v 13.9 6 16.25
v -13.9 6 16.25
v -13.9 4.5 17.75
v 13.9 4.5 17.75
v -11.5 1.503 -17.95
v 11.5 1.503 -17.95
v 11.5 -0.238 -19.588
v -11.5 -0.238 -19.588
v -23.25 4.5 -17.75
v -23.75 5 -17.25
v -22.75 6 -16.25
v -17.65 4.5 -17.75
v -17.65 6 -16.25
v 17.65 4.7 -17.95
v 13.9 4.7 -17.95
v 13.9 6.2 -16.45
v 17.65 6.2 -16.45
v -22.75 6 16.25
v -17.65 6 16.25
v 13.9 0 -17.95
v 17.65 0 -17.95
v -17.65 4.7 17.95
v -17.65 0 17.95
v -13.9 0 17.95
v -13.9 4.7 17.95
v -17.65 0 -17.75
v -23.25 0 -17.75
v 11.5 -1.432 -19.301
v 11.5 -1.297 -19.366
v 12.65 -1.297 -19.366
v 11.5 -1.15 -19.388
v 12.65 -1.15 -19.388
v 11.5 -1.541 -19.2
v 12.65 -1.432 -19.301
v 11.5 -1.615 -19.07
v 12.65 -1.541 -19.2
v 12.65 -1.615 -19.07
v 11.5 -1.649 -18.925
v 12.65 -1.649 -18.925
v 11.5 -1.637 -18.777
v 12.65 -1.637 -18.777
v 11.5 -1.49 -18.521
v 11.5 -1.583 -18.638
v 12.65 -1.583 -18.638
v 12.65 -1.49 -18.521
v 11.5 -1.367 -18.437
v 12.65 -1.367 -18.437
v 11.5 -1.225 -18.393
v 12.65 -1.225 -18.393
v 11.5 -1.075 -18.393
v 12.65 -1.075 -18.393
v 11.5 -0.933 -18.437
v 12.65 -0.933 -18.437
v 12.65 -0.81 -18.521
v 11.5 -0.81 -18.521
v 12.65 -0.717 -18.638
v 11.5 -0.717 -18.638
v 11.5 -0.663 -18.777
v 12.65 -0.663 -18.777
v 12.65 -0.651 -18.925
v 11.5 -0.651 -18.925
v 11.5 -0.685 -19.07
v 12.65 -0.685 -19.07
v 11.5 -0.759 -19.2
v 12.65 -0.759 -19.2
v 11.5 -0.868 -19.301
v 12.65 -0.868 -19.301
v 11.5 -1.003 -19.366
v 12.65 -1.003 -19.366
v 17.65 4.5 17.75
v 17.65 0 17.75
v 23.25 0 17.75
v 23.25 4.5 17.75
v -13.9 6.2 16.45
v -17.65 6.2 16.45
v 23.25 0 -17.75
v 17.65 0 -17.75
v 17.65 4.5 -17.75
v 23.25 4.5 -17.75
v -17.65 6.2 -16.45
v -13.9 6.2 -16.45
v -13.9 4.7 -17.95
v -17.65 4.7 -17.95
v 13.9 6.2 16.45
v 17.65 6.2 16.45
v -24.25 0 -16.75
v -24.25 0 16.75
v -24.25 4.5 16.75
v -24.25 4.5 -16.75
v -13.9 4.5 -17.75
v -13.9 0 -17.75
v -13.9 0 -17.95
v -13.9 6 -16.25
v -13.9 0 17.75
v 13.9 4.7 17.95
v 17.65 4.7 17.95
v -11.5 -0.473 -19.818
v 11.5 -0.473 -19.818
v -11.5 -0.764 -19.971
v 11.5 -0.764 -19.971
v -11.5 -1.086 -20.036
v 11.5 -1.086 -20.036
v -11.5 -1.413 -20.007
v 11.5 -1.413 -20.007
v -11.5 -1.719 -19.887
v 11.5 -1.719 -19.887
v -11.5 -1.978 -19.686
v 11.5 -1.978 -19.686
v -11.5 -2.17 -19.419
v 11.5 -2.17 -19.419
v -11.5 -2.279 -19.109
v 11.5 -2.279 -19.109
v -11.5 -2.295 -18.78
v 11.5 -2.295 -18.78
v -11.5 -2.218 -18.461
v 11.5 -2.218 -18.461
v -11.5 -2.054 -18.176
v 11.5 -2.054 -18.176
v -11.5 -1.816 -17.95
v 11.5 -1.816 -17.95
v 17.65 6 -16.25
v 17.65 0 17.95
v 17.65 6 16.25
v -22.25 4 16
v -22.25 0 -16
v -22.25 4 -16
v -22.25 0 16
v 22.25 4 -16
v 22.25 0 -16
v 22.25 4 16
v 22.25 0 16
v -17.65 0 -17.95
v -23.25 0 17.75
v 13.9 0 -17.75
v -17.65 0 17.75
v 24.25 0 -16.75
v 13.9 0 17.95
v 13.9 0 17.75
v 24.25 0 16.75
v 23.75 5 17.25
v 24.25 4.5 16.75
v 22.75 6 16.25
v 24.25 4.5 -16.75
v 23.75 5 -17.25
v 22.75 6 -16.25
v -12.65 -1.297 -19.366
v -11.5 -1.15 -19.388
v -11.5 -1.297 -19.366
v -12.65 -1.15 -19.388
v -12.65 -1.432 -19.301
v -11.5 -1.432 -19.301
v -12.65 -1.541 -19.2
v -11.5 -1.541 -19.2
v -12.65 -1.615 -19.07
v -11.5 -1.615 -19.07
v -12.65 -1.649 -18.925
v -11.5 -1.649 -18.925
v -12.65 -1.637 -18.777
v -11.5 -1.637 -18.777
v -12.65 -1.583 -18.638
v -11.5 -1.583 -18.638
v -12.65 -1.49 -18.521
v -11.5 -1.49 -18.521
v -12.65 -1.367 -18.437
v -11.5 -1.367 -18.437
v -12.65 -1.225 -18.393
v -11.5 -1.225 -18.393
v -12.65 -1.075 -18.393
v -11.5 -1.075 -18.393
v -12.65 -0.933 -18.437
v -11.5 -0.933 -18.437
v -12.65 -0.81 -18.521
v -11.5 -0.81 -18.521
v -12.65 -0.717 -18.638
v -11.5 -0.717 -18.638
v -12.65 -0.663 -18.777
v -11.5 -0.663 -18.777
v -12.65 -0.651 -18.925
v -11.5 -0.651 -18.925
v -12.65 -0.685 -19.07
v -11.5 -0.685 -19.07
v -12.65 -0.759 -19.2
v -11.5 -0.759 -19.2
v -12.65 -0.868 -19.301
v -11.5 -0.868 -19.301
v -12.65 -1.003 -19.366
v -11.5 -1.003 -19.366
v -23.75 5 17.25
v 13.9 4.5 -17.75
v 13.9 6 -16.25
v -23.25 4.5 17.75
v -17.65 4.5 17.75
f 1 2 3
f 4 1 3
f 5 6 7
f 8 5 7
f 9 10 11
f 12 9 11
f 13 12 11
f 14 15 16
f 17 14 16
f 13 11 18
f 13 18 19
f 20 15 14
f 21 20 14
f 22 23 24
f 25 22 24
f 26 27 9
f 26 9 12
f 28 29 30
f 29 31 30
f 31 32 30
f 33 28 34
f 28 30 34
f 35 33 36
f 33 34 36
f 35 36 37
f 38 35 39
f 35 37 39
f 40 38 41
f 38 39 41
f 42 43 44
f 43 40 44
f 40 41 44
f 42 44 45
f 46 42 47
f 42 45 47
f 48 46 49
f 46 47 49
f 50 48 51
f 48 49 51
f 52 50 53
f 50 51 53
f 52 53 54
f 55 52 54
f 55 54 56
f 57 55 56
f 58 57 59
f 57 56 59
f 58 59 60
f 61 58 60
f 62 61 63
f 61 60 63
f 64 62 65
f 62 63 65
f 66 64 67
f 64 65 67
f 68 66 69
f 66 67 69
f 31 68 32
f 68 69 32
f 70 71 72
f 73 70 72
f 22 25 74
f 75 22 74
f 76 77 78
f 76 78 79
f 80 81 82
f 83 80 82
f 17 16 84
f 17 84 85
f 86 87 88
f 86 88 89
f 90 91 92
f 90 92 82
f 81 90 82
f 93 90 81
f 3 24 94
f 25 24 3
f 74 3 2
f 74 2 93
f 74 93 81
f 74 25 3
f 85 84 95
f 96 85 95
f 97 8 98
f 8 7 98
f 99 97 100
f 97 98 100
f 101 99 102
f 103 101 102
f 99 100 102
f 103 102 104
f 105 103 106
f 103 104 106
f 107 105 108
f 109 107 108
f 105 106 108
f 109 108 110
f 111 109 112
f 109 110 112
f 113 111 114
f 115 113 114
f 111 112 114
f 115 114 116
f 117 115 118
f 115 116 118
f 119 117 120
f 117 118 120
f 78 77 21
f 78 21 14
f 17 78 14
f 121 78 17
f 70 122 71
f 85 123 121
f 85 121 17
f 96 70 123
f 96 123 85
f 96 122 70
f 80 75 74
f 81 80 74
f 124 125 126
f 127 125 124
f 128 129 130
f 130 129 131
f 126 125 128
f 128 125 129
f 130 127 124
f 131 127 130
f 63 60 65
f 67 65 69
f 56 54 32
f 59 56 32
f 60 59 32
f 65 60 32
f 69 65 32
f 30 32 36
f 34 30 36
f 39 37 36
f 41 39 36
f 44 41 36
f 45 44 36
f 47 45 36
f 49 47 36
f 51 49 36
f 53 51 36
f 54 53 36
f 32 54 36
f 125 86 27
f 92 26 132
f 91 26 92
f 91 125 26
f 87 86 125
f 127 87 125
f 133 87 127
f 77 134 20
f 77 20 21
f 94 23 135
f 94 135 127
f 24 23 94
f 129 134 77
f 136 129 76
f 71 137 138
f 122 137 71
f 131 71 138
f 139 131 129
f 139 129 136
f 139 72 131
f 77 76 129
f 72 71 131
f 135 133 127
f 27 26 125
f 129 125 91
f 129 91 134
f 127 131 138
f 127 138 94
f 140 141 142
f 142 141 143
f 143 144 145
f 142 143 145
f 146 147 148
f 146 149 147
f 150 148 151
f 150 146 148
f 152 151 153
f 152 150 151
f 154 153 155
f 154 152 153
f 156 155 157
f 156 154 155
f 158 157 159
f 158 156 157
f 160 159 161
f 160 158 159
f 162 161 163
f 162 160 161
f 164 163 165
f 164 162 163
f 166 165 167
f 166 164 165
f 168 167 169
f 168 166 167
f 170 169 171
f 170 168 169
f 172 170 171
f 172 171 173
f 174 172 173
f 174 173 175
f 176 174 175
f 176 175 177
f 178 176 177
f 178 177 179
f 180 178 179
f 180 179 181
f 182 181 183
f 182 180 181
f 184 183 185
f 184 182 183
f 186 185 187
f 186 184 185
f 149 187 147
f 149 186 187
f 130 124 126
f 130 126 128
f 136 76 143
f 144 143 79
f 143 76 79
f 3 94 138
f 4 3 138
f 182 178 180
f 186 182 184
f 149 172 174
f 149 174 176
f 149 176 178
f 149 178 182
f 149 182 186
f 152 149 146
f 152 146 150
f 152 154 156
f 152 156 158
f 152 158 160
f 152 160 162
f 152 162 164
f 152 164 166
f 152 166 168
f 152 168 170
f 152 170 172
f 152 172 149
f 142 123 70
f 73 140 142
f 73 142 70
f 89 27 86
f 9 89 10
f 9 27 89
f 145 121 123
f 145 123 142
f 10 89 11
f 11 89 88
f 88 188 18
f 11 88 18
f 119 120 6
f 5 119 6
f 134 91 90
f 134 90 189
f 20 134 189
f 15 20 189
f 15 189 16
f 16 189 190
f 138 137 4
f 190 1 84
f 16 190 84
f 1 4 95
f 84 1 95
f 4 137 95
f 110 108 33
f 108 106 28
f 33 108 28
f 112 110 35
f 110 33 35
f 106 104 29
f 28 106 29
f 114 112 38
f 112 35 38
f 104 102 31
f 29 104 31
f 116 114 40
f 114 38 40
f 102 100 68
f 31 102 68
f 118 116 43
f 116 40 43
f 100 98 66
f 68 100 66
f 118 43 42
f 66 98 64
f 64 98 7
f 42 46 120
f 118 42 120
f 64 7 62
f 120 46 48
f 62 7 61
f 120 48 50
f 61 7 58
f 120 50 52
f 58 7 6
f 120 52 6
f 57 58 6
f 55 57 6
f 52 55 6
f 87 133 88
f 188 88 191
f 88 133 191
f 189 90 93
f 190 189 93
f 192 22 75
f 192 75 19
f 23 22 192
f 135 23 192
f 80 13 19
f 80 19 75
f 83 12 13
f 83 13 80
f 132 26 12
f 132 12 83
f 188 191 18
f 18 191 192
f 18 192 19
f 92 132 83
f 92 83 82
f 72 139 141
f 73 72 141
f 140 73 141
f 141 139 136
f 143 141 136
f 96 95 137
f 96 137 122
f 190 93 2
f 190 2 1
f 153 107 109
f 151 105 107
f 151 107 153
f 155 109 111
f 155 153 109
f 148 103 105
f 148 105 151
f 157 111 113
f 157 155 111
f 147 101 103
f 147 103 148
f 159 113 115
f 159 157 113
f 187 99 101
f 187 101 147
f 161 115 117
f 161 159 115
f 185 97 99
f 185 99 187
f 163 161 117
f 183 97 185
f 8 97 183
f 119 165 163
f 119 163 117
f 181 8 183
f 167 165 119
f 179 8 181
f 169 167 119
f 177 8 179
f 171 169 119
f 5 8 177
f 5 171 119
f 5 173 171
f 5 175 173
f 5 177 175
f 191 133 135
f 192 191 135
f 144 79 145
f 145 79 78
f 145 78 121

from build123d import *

# Parameters (mm, degrees)
CROQUIS1_W              = 48.5
CROQUIS1_H              = 35.5
SALIENTE_EXTRUIR1_DEPTH = 6
CHAFL_N1_SIZE           = 1
CROQUIS3_W              = 3.75
CROQUIS3_H              = 35.5
SALIENTE_EXTRUIR3_DEPTH = 0.2
CROQUIS4_W              = 3.75
CROQUIS4_H              = 6.2
SALIENTE_EXTRUIR4_DEPTH = 0.2
CROQUIS2_W              = 44.5
CROQUIS2_H              = 32
CORTAR_EXTRUIR1_DEPTH   = 4
CHAFL_N2_SIZE           = 1.5
SALIENTE_EXTRUIR5_DEPTH = 11.5
CROQUIS6_R              = 0.5
SALIENTE_EXTRUIR6_DEPTH = 1.15


with BuildPart() as part:
    # Croquis1 → Saliente-Extruir1 (new body)
    with BuildSketch(Plane(origin=(19.920493139, 0, 21.30129266), x_dir=(1, 0, 0), z_dir=(0, 1, 0))):
        with Locations((-19.920493139, 21.30129266)):
            Rectangle(CROQUIS1_W, CROQUIS1_H)
    extrude(amount=SALIENTE_EXTRUIR1_DEPTH)

    # Chaflán1
    chafl_n1_edges = [part.edges().sort_by_distance(p)[0] for p in [
        (24.25, 3, 17.75),
        (-24.25, 3, 17.75),
        (-24.25, 3, -17.75),
        (24.25, 3, -17.75),
    ]]
    chamfer(chafl_n1_edges, length=CHAFL_N1_SIZE)

    # Croquis3 → Saliente-Extruir3 (add)
    with BuildSketch(Plane(origin=(0, 6, 0), x_dir=(1, 0, 0), z_dir=(0, 1, 0))):
        with Locations((15.775, 0)):
            Rectangle(CROQUIS3_W, CROQUIS3_H)
        with Locations((-15.775, 0)):
            Rectangle(CROQUIS3_W, CROQUIS3_H)
    extrude(amount=SALIENTE_EXTRUIR3_DEPTH)

    # Croquis4 → Saliente-Extruir4 (add)
    with BuildSketch(Plane.XY.offset(17.75)):
        with Locations((15.775, 3.1)):
            Rectangle(CROQUIS4_W, CROQUIS4_H)
        with Locations((-15.775, 3.1)):
            Rectangle(CROQUIS4_W, CROQUIS4_H)
    saliente_extruir4 = extrude(amount=SALIENTE_EXTRUIR4_DEPTH)

    # Croquis2 → Cortar-Extruir1 (cut)
    with BuildSketch(Plane.XZ):
        Rectangle(CROQUIS2_W, CROQUIS2_H)
    extrude(amount=-CORTAR_EXTRUIR1_DEPTH, mode=Mode.SUBTRACT)

    # Simetría1: Saliente-Extruir4 across plane
    add(saliente_extruir4.mirror(Plane.XY))

    # Chaflán2
    # the kernel refuses this chamfer: 1.5 mm, written as the material it takes off along each edge
    with BuildSketch(Plane(origin=(-21.507524482, 6.2, -17.95), x_dir=(0, 0.02749587661058619, 0.9996219169112968), z_dir=(1, 0, 0)), Plane(origin=(21.507524482, 6.2, -17.95), x_dir=(0, -0.9996219169112968, -0.02749587661058678), z_dir=(-1, 0, 0)), Plane(origin=(-21.507524482, 6.2, 17.95), x_dir=(0, -0.9996219169112968, 0.02749587661058678), z_dir=(1, 0, 0)), Plane(origin=(21.507524482, 6.2, 17.95), x_dir=(0, 0.02749587661058619, -0.9996219169112968), z_dir=(-1, 0, 0))) as chafl_n2_piece_1:
        Polygon((CHAFL_N2_SIZE * 0.999621916911, CHAFL_N2_SIZE * 0.0274958766106), (-CHAFL_N2_SIZE * 0.0274958766106, CHAFL_N2_SIZE * 0.999621916911), (0, 0), align=None)
    extrude(amount=11.465048964, mode=Mode.SUBTRACT)
    with BuildSketch(Plane(origin=(24.25, 6, -20.607524482), x_dir=(0.02749587661058678, -0.9996219169112968, 0), z_dir=(0, 0, 1)), Plane(origin=(-24.25, 6, 20.607524482), x_dir=(-0.02749587661058678, -0.9996219169112968, 0), z_dir=(0, 0, -1))) as chafl_n2_piece_2:
        Polygon((CHAFL_N2_SIZE * 0.999621916911, -CHAFL_N2_SIZE * 0.0274958766106), (-CHAFL_N2_SIZE * 0.0274958766106, -CHAFL_N2_SIZE * 0.999621916911), (0, 0), align=None)
    extrude(amount=41.215048964, mode=Mode.SUBTRACT)
    with BuildSketch(Plane(origin=(27.107524482, 6, 17.75), x_dir=(0, 0.02749587661058619, -0.9996219169112968), z_dir=(-1, 0, 0))) as chafl_n2_piece_3:
        Polygon((CHAFL_N2_SIZE * 0.999621916911, CHAFL_N2_SIZE * 0.0274958766106), (-CHAFL_N2_SIZE * 0.0274958766106, CHAFL_N2_SIZE * 0.999621916911), (0, 0), align=None)
    extrude(amount=9.457524482, mode=Mode.SUBTRACT)
    with BuildSketch(Plane(origin=(27.107524482, 6, 17.75), x_dir=(0, 0.02749587661058619, -0.9996219169112968), z_dir=(-1, 0, 0))) as chafl_n2_piece_4_section:
        Polygon((CHAFL_N2_SIZE * 0.999621916911, CHAFL_N2_SIZE * 0.0274958766106), (-CHAFL_N2_SIZE * 0.0274958766106, CHAFL_N2_SIZE * 0.999621916911), (0, 0), align=None)
    chafl_n2_piece_4 = extrude(amount=13.315048964, mode=Mode.PRIVATE)
    chafl_n2_piece_4 = split(chafl_n2_piece_4, bisect_by=Plane(origin=(13.9, 5.50530956, 17.25530956), z_dir=(-1, 0, 0)), keep=Keep.TOP, mode=Mode.PRIVATE)
    add(chafl_n2_piece_4, mode=Mode.SUBTRACT)
    with BuildSketch(Plane(origin=(13.792475518, 6, -17.75), x_dir=(0, -0.9996219169112968, -0.02749587661058678), z_dir=(1, 0, 0))) as chafl_n2_piece_5_section:
        Polygon((CHAFL_N2_SIZE * 0.999621916911, -CHAFL_N2_SIZE * 0.0274958766106), (-CHAFL_N2_SIZE * 0.0274958766106, -CHAFL_N2_SIZE * 0.999621916911), (0, 0), align=None)
    chafl_n2_piece_5 = extrude(amount=13.315048964, mode=Mode.PRIVATE)
    chafl_n2_piece_5 = split(chafl_n2_piece_5, bisect_by=Plane(origin=(13.9, 5.50530956, -17.25530956), z_dir=(-1, 0, 0)), keep=Keep.TOP, mode=Mode.PRIVATE)
    add(chafl_n2_piece_5, mode=Mode.SUBTRACT)
    with BuildSketch(Plane(origin=(17.65, 6, -17.75), x_dir=(0, -0.9996219169112968, -0.02749587661058678), z_dir=(1, 0, 0)), Plane(origin=(-27.107524482, 6, -17.75), x_dir=(0, -0.9996219169112968, -0.02749587661058678), z_dir=(1, 0, 0)), Plane(origin=(-17.65, 6, 17.75), x_dir=(0, -0.9996219169112968, 0.02749587661058678), z_dir=(-1, 0, 0))) as chafl_n2_piece_6:
        Polygon((CHAFL_N2_SIZE * 0.999621916911, -CHAFL_N2_SIZE * 0.0274958766106), (-CHAFL_N2_SIZE * 0.0274958766106, -CHAFL_N2_SIZE * 0.999621916911), (0, 0), align=None)
    extrude(amount=9.457524482, mode=Mode.SUBTRACT)
    with BuildSketch(Plane(origin=(-17.757524482, 6, -17.75), x_dir=(0, -0.9996219169112968, -0.02749587661058678), z_dir=(1, 0, 0))) as chafl_n2_piece_7_section:
        Polygon((CHAFL_N2_SIZE * 0.999621916911, -CHAFL_N2_SIZE * 0.0274958766106), (-CHAFL_N2_SIZE * 0.0274958766106, -CHAFL_N2_SIZE * 0.999621916911), (0, 0), align=None)
    chafl_n2_piece_7 = extrude(amount=31.657524482, mode=Mode.PRIVATE)
    chafl_n2_piece_7 = split(chafl_n2_piece_7, bisect_by=Plane(origin=(-17.65, 5.50530956, -17.25530956), z_dir=(-1, 0, 0)), keep=Keep.TOP, mode=Mode.PRIVATE)
    add(chafl_n2_piece_7, mode=Mode.SUBTRACT)
    with BuildSketch(Plane(origin=(-13.9, 6, -17.75), x_dir=(0, -0.9996219169112968, -0.02749587661058678), z_dir=(1, 0, 0)), Plane(origin=(13.9, 6, 17.75), x_dir=(0, -0.9996219169112968, 0.02749587661058678), z_dir=(-1, 0, 0))) as chafl_n2_piece_8:
        Polygon((CHAFL_N2_SIZE * 0.999621916911, -CHAFL_N2_SIZE * 0.0274958766106), (-CHAFL_N2_SIZE * 0.0274958766106, -CHAFL_N2_SIZE * 0.999621916911), (0, 0), align=None)
    extrude(amount=27.8, mode=Mode.SUBTRACT)
    with BuildSketch(Plane(origin=(-13.9, 6, -17.75), x_dir=(0, -0.9996219169112968, -0.02749587661058678), z_dir=(1, 0, 0))) as chafl_n2_piece_9_section:
        Polygon((CHAFL_N2_SIZE * 0.999621916911, -CHAFL_N2_SIZE * 0.0274958766106), (-CHAFL_N2_SIZE * 0.0274958766106, -CHAFL_N2_SIZE * 0.999621916911), (0, 0), align=None)
    chafl_n2_piece_9 = extrude(amount=31.657524482, mode=Mode.PRIVATE)
    chafl_n2_piece_9 = split(chafl_n2_piece_9, bisect_by=Plane(origin=(17.65, 5.50530956, -17.25530956), z_dir=(1, 0, 0)), keep=Keep.TOP, mode=Mode.PRIVATE)
    add(chafl_n2_piece_9, mode=Mode.SUBTRACT)
    with BuildSketch(Plane(origin=(-27.107524482, 6, -17.75), x_dir=(0, -0.9996219169112968, -0.02749587661058678), z_dir=(1, 0, 0))) as chafl_n2_piece_10_section:
        Polygon((CHAFL_N2_SIZE * 0.999621916911, -CHAFL_N2_SIZE * 0.0274958766106), (-CHAFL_N2_SIZE * 0.0274958766106, -CHAFL_N2_SIZE * 0.999621916911), (0, 0), align=None)
    chafl_n2_piece_10 = extrude(amount=13.315048964, mode=Mode.PRIVATE)
    chafl_n2_piece_10 = split(chafl_n2_piece_10, bisect_by=Plane(origin=(-13.9, 5.50530956, -17.25530956), z_dir=(1, 0, 0)), keep=Keep.TOP, mode=Mode.PRIVATE)
    add(chafl_n2_piece_10, mode=Mode.SUBTRACT)
    with BuildSketch(Plane(origin=(-13.792475518, 6, 17.75), x_dir=(0, -0.9996219169112968, 0.02749587661058678), z_dir=(-1, 0, 0))) as chafl_n2_piece_11_section:
        Polygon((CHAFL_N2_SIZE * 0.999621916911, -CHAFL_N2_SIZE * 0.0274958766106), (-CHAFL_N2_SIZE * 0.0274958766106, -CHAFL_N2_SIZE * 0.999621916911), (0, 0), align=None)
    chafl_n2_piece_11 = extrude(amount=13.315048964, mode=Mode.PRIVATE)
    chafl_n2_piece_11 = split(chafl_n2_piece_11, bisect_by=Plane(origin=(-13.9, 5.50530956, 17.25530956), z_dir=(1, 0, 0)), keep=Keep.TOP, mode=Mode.PRIVATE)
    add(chafl_n2_piece_11, mode=Mode.SUBTRACT)
    with BuildSketch(Plane(origin=(17.757524482, 6, 17.75), x_dir=(0, -0.9996219169112968, 0.02749587661058678), z_dir=(-1, 0, 0))) as chafl_n2_piece_12_section:
        Polygon((CHAFL_N2_SIZE * 0.999621916911, -CHAFL_N2_SIZE * 0.0274958766106), (-CHAFL_N2_SIZE * 0.0274958766106, -CHAFL_N2_SIZE * 0.999621916911), (0, 0), align=None)
    chafl_n2_piece_12 = extrude(amount=31.657524482, mode=Mode.PRIVATE)
    chafl_n2_piece_12 = split(chafl_n2_piece_12, bisect_by=Plane(origin=(17.65, 5.50530956, 17.25530956), z_dir=(1, 0, 0)), keep=Keep.TOP, mode=Mode.PRIVATE)
    add(chafl_n2_piece_12, mode=Mode.SUBTRACT)
    with BuildSketch(Plane(origin=(13.9, 6, 17.75), x_dir=(0, -0.9996219169112968, 0.02749587661058678), z_dir=(-1, 0, 0))) as chafl_n2_piece_13_section:
        Polygon((CHAFL_N2_SIZE * 0.999621916911, -CHAFL_N2_SIZE * 0.0274958766106), (-CHAFL_N2_SIZE * 0.0274958766106, -CHAFL_N2_SIZE * 0.999621916911), (0, 0), align=None)
    chafl_n2_piece_13 = extrude(amount=31.657524482, mode=Mode.PRIVATE)
    chafl_n2_piece_13 = split(chafl_n2_piece_13, bisect_by=Plane(origin=(-17.65, 5.50530956, 17.25530956), z_dir=(-1, 0, 0)), keep=Keep.TOP, mode=Mode.PRIVATE)
    add(chafl_n2_piece_13, mode=Mode.SUBTRACT)


with BuildPart() as body_2:
    # Croquis5 → Saliente-Extruir5 (new, symmetric)
    with BuildSketch(Plane(origin=(0, 0, 0), x_dir=(0, 0, -1), z_dir=(1, 0, 0))):
        with BuildLine():
            Line((17.95, 1.502646226), (19.588178522, -0.237858692))
            ThreePointArc((19.588178522, -0.237858692), (19.685565736, -1.978315216), (17.95, -1.815573833))
            Line((17.95, -1.815573833), (17.95, 1.502646226))
        make_face()
    extrude(amount=SALIENTE_EXTRUIR5_DEPTH, both=True)

    # Croquis6 → Saliente-Extruir6 (add, symmetric)
    with BuildSketch(Plane.ZY.offset(11.5)):
        with Locations(Location((-18.88782273, -1.15, 0), (0, 0, 180))):
            Circle(CROQUIS6_R)
    saliente_extruir6 = extrude(amount=SALIENTE_EXTRUIR6_DEPTH, both=True)

    # Simetría2: Saliente-Extruir6 across plane
    add(saliente_extruir6.mirror(Plane(origin=(0, 0, 0), x_dir=(0, 0, 1), z_dir=(1, 0, 0))))


solid = Compound([part.part, body_2.part])
